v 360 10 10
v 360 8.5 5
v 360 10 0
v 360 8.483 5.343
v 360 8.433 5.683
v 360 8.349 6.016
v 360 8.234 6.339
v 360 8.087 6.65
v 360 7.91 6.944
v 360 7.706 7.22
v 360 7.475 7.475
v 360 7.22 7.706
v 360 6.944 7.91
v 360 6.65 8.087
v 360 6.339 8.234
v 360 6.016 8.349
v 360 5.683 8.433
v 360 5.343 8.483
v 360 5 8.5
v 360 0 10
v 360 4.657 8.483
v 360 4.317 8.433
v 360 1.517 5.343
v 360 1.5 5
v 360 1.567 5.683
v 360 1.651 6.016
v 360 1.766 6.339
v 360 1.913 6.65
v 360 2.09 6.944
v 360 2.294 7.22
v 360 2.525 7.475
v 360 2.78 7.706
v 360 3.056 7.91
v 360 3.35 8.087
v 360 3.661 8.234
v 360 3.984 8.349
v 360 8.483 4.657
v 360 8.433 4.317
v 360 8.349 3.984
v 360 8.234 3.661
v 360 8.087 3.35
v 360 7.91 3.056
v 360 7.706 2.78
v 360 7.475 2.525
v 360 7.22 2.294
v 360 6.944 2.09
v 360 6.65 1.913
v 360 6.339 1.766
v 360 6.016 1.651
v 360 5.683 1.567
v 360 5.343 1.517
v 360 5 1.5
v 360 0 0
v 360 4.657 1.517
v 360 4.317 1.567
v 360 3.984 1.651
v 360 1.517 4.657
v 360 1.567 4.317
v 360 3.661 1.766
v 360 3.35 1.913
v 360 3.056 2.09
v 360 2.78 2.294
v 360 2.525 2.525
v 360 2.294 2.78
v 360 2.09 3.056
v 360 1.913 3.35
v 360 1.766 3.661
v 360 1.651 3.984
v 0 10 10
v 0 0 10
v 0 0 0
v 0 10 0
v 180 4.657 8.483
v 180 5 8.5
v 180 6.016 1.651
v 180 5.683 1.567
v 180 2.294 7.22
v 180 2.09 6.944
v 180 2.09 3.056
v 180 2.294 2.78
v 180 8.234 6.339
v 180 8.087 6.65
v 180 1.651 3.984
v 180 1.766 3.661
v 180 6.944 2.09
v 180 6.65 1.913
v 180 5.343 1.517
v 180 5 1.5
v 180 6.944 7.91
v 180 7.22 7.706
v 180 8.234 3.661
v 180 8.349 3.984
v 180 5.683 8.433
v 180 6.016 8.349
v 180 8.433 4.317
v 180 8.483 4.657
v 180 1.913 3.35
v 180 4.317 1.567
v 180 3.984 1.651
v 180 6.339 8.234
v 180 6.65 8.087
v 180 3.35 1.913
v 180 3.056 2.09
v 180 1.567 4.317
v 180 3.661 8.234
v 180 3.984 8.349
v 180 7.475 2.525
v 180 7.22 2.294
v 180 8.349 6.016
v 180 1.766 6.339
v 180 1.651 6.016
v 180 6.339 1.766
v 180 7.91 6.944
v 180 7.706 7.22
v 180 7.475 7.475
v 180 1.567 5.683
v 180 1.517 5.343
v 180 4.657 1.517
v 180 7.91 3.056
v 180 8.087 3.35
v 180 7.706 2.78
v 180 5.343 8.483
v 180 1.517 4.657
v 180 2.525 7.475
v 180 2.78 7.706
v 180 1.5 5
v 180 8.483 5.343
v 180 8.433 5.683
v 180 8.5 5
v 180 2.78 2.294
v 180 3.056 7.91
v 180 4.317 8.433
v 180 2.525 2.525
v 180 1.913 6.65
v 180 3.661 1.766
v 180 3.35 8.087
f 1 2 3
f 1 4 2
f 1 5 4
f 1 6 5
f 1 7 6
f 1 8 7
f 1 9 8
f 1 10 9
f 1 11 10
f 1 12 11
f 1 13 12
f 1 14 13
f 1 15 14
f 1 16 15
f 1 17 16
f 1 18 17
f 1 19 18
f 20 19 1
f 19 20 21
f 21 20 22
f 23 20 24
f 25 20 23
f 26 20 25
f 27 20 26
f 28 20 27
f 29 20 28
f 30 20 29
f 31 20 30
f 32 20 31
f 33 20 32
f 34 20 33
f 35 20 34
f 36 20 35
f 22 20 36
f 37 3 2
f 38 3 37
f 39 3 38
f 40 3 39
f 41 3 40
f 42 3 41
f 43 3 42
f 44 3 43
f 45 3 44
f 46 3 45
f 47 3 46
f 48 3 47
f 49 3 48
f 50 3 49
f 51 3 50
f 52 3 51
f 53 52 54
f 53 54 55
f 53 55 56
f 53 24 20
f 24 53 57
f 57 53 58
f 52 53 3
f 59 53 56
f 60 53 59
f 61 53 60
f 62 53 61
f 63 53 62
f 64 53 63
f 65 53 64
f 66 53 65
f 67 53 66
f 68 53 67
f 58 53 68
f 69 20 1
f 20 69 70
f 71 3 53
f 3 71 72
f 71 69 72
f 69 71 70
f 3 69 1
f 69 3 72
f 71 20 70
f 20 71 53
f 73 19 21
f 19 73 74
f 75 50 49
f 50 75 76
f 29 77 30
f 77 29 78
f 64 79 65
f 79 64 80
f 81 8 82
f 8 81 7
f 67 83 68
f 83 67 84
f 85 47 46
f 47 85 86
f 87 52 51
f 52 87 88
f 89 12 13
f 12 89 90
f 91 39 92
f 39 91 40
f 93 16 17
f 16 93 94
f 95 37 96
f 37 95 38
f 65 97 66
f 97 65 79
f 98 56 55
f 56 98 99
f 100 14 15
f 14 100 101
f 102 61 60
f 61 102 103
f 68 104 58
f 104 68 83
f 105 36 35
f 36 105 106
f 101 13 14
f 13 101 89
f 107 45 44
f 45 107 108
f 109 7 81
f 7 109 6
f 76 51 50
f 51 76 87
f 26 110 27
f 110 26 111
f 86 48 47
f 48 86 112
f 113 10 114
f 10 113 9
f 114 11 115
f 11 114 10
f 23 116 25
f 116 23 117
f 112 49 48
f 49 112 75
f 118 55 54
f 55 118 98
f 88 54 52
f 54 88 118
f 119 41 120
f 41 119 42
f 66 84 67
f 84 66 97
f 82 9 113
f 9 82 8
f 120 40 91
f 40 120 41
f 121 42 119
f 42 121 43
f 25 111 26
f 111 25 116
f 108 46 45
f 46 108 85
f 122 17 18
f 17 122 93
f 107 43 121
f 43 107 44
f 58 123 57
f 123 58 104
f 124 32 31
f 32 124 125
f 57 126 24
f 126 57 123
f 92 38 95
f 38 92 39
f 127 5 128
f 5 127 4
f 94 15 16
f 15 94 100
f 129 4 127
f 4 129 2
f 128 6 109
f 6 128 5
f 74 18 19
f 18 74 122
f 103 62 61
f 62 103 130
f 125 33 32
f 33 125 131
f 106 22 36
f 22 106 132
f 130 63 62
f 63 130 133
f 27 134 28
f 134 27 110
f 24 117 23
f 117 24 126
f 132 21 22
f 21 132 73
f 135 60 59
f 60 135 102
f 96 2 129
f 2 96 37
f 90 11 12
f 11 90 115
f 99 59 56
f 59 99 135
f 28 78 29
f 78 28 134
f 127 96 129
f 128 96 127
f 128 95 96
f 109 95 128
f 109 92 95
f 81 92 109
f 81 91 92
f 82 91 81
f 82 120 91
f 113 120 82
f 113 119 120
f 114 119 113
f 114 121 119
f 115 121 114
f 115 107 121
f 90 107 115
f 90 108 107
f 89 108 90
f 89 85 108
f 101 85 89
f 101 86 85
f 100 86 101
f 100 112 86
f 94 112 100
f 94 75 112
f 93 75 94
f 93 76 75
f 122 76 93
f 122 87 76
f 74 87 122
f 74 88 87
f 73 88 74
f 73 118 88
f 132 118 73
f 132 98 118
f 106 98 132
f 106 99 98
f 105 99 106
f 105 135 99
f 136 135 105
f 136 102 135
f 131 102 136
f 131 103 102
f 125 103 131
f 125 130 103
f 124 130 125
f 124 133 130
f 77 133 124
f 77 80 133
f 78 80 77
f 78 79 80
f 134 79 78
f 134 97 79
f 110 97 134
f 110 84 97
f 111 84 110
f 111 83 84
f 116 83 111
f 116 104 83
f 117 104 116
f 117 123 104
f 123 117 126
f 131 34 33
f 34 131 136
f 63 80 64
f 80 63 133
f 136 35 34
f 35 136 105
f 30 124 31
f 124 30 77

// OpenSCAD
// column_half.scad (corner: -x, -y, upper)

length = 360;
thk = 10;
hole_d = 7; // clearance for M6
$fn = 64;

module column_segment(len=length, t=thk, hd=hole_d) {
    difference() {
        translate([0,0,0]) cube([len, t, t]);
        translate([len/2, t/2, t/2]) rotate([0,90,0]) cylinder(r=hd/2, h=len + 20, $fn=$fn);
    }
}

column_segment();
